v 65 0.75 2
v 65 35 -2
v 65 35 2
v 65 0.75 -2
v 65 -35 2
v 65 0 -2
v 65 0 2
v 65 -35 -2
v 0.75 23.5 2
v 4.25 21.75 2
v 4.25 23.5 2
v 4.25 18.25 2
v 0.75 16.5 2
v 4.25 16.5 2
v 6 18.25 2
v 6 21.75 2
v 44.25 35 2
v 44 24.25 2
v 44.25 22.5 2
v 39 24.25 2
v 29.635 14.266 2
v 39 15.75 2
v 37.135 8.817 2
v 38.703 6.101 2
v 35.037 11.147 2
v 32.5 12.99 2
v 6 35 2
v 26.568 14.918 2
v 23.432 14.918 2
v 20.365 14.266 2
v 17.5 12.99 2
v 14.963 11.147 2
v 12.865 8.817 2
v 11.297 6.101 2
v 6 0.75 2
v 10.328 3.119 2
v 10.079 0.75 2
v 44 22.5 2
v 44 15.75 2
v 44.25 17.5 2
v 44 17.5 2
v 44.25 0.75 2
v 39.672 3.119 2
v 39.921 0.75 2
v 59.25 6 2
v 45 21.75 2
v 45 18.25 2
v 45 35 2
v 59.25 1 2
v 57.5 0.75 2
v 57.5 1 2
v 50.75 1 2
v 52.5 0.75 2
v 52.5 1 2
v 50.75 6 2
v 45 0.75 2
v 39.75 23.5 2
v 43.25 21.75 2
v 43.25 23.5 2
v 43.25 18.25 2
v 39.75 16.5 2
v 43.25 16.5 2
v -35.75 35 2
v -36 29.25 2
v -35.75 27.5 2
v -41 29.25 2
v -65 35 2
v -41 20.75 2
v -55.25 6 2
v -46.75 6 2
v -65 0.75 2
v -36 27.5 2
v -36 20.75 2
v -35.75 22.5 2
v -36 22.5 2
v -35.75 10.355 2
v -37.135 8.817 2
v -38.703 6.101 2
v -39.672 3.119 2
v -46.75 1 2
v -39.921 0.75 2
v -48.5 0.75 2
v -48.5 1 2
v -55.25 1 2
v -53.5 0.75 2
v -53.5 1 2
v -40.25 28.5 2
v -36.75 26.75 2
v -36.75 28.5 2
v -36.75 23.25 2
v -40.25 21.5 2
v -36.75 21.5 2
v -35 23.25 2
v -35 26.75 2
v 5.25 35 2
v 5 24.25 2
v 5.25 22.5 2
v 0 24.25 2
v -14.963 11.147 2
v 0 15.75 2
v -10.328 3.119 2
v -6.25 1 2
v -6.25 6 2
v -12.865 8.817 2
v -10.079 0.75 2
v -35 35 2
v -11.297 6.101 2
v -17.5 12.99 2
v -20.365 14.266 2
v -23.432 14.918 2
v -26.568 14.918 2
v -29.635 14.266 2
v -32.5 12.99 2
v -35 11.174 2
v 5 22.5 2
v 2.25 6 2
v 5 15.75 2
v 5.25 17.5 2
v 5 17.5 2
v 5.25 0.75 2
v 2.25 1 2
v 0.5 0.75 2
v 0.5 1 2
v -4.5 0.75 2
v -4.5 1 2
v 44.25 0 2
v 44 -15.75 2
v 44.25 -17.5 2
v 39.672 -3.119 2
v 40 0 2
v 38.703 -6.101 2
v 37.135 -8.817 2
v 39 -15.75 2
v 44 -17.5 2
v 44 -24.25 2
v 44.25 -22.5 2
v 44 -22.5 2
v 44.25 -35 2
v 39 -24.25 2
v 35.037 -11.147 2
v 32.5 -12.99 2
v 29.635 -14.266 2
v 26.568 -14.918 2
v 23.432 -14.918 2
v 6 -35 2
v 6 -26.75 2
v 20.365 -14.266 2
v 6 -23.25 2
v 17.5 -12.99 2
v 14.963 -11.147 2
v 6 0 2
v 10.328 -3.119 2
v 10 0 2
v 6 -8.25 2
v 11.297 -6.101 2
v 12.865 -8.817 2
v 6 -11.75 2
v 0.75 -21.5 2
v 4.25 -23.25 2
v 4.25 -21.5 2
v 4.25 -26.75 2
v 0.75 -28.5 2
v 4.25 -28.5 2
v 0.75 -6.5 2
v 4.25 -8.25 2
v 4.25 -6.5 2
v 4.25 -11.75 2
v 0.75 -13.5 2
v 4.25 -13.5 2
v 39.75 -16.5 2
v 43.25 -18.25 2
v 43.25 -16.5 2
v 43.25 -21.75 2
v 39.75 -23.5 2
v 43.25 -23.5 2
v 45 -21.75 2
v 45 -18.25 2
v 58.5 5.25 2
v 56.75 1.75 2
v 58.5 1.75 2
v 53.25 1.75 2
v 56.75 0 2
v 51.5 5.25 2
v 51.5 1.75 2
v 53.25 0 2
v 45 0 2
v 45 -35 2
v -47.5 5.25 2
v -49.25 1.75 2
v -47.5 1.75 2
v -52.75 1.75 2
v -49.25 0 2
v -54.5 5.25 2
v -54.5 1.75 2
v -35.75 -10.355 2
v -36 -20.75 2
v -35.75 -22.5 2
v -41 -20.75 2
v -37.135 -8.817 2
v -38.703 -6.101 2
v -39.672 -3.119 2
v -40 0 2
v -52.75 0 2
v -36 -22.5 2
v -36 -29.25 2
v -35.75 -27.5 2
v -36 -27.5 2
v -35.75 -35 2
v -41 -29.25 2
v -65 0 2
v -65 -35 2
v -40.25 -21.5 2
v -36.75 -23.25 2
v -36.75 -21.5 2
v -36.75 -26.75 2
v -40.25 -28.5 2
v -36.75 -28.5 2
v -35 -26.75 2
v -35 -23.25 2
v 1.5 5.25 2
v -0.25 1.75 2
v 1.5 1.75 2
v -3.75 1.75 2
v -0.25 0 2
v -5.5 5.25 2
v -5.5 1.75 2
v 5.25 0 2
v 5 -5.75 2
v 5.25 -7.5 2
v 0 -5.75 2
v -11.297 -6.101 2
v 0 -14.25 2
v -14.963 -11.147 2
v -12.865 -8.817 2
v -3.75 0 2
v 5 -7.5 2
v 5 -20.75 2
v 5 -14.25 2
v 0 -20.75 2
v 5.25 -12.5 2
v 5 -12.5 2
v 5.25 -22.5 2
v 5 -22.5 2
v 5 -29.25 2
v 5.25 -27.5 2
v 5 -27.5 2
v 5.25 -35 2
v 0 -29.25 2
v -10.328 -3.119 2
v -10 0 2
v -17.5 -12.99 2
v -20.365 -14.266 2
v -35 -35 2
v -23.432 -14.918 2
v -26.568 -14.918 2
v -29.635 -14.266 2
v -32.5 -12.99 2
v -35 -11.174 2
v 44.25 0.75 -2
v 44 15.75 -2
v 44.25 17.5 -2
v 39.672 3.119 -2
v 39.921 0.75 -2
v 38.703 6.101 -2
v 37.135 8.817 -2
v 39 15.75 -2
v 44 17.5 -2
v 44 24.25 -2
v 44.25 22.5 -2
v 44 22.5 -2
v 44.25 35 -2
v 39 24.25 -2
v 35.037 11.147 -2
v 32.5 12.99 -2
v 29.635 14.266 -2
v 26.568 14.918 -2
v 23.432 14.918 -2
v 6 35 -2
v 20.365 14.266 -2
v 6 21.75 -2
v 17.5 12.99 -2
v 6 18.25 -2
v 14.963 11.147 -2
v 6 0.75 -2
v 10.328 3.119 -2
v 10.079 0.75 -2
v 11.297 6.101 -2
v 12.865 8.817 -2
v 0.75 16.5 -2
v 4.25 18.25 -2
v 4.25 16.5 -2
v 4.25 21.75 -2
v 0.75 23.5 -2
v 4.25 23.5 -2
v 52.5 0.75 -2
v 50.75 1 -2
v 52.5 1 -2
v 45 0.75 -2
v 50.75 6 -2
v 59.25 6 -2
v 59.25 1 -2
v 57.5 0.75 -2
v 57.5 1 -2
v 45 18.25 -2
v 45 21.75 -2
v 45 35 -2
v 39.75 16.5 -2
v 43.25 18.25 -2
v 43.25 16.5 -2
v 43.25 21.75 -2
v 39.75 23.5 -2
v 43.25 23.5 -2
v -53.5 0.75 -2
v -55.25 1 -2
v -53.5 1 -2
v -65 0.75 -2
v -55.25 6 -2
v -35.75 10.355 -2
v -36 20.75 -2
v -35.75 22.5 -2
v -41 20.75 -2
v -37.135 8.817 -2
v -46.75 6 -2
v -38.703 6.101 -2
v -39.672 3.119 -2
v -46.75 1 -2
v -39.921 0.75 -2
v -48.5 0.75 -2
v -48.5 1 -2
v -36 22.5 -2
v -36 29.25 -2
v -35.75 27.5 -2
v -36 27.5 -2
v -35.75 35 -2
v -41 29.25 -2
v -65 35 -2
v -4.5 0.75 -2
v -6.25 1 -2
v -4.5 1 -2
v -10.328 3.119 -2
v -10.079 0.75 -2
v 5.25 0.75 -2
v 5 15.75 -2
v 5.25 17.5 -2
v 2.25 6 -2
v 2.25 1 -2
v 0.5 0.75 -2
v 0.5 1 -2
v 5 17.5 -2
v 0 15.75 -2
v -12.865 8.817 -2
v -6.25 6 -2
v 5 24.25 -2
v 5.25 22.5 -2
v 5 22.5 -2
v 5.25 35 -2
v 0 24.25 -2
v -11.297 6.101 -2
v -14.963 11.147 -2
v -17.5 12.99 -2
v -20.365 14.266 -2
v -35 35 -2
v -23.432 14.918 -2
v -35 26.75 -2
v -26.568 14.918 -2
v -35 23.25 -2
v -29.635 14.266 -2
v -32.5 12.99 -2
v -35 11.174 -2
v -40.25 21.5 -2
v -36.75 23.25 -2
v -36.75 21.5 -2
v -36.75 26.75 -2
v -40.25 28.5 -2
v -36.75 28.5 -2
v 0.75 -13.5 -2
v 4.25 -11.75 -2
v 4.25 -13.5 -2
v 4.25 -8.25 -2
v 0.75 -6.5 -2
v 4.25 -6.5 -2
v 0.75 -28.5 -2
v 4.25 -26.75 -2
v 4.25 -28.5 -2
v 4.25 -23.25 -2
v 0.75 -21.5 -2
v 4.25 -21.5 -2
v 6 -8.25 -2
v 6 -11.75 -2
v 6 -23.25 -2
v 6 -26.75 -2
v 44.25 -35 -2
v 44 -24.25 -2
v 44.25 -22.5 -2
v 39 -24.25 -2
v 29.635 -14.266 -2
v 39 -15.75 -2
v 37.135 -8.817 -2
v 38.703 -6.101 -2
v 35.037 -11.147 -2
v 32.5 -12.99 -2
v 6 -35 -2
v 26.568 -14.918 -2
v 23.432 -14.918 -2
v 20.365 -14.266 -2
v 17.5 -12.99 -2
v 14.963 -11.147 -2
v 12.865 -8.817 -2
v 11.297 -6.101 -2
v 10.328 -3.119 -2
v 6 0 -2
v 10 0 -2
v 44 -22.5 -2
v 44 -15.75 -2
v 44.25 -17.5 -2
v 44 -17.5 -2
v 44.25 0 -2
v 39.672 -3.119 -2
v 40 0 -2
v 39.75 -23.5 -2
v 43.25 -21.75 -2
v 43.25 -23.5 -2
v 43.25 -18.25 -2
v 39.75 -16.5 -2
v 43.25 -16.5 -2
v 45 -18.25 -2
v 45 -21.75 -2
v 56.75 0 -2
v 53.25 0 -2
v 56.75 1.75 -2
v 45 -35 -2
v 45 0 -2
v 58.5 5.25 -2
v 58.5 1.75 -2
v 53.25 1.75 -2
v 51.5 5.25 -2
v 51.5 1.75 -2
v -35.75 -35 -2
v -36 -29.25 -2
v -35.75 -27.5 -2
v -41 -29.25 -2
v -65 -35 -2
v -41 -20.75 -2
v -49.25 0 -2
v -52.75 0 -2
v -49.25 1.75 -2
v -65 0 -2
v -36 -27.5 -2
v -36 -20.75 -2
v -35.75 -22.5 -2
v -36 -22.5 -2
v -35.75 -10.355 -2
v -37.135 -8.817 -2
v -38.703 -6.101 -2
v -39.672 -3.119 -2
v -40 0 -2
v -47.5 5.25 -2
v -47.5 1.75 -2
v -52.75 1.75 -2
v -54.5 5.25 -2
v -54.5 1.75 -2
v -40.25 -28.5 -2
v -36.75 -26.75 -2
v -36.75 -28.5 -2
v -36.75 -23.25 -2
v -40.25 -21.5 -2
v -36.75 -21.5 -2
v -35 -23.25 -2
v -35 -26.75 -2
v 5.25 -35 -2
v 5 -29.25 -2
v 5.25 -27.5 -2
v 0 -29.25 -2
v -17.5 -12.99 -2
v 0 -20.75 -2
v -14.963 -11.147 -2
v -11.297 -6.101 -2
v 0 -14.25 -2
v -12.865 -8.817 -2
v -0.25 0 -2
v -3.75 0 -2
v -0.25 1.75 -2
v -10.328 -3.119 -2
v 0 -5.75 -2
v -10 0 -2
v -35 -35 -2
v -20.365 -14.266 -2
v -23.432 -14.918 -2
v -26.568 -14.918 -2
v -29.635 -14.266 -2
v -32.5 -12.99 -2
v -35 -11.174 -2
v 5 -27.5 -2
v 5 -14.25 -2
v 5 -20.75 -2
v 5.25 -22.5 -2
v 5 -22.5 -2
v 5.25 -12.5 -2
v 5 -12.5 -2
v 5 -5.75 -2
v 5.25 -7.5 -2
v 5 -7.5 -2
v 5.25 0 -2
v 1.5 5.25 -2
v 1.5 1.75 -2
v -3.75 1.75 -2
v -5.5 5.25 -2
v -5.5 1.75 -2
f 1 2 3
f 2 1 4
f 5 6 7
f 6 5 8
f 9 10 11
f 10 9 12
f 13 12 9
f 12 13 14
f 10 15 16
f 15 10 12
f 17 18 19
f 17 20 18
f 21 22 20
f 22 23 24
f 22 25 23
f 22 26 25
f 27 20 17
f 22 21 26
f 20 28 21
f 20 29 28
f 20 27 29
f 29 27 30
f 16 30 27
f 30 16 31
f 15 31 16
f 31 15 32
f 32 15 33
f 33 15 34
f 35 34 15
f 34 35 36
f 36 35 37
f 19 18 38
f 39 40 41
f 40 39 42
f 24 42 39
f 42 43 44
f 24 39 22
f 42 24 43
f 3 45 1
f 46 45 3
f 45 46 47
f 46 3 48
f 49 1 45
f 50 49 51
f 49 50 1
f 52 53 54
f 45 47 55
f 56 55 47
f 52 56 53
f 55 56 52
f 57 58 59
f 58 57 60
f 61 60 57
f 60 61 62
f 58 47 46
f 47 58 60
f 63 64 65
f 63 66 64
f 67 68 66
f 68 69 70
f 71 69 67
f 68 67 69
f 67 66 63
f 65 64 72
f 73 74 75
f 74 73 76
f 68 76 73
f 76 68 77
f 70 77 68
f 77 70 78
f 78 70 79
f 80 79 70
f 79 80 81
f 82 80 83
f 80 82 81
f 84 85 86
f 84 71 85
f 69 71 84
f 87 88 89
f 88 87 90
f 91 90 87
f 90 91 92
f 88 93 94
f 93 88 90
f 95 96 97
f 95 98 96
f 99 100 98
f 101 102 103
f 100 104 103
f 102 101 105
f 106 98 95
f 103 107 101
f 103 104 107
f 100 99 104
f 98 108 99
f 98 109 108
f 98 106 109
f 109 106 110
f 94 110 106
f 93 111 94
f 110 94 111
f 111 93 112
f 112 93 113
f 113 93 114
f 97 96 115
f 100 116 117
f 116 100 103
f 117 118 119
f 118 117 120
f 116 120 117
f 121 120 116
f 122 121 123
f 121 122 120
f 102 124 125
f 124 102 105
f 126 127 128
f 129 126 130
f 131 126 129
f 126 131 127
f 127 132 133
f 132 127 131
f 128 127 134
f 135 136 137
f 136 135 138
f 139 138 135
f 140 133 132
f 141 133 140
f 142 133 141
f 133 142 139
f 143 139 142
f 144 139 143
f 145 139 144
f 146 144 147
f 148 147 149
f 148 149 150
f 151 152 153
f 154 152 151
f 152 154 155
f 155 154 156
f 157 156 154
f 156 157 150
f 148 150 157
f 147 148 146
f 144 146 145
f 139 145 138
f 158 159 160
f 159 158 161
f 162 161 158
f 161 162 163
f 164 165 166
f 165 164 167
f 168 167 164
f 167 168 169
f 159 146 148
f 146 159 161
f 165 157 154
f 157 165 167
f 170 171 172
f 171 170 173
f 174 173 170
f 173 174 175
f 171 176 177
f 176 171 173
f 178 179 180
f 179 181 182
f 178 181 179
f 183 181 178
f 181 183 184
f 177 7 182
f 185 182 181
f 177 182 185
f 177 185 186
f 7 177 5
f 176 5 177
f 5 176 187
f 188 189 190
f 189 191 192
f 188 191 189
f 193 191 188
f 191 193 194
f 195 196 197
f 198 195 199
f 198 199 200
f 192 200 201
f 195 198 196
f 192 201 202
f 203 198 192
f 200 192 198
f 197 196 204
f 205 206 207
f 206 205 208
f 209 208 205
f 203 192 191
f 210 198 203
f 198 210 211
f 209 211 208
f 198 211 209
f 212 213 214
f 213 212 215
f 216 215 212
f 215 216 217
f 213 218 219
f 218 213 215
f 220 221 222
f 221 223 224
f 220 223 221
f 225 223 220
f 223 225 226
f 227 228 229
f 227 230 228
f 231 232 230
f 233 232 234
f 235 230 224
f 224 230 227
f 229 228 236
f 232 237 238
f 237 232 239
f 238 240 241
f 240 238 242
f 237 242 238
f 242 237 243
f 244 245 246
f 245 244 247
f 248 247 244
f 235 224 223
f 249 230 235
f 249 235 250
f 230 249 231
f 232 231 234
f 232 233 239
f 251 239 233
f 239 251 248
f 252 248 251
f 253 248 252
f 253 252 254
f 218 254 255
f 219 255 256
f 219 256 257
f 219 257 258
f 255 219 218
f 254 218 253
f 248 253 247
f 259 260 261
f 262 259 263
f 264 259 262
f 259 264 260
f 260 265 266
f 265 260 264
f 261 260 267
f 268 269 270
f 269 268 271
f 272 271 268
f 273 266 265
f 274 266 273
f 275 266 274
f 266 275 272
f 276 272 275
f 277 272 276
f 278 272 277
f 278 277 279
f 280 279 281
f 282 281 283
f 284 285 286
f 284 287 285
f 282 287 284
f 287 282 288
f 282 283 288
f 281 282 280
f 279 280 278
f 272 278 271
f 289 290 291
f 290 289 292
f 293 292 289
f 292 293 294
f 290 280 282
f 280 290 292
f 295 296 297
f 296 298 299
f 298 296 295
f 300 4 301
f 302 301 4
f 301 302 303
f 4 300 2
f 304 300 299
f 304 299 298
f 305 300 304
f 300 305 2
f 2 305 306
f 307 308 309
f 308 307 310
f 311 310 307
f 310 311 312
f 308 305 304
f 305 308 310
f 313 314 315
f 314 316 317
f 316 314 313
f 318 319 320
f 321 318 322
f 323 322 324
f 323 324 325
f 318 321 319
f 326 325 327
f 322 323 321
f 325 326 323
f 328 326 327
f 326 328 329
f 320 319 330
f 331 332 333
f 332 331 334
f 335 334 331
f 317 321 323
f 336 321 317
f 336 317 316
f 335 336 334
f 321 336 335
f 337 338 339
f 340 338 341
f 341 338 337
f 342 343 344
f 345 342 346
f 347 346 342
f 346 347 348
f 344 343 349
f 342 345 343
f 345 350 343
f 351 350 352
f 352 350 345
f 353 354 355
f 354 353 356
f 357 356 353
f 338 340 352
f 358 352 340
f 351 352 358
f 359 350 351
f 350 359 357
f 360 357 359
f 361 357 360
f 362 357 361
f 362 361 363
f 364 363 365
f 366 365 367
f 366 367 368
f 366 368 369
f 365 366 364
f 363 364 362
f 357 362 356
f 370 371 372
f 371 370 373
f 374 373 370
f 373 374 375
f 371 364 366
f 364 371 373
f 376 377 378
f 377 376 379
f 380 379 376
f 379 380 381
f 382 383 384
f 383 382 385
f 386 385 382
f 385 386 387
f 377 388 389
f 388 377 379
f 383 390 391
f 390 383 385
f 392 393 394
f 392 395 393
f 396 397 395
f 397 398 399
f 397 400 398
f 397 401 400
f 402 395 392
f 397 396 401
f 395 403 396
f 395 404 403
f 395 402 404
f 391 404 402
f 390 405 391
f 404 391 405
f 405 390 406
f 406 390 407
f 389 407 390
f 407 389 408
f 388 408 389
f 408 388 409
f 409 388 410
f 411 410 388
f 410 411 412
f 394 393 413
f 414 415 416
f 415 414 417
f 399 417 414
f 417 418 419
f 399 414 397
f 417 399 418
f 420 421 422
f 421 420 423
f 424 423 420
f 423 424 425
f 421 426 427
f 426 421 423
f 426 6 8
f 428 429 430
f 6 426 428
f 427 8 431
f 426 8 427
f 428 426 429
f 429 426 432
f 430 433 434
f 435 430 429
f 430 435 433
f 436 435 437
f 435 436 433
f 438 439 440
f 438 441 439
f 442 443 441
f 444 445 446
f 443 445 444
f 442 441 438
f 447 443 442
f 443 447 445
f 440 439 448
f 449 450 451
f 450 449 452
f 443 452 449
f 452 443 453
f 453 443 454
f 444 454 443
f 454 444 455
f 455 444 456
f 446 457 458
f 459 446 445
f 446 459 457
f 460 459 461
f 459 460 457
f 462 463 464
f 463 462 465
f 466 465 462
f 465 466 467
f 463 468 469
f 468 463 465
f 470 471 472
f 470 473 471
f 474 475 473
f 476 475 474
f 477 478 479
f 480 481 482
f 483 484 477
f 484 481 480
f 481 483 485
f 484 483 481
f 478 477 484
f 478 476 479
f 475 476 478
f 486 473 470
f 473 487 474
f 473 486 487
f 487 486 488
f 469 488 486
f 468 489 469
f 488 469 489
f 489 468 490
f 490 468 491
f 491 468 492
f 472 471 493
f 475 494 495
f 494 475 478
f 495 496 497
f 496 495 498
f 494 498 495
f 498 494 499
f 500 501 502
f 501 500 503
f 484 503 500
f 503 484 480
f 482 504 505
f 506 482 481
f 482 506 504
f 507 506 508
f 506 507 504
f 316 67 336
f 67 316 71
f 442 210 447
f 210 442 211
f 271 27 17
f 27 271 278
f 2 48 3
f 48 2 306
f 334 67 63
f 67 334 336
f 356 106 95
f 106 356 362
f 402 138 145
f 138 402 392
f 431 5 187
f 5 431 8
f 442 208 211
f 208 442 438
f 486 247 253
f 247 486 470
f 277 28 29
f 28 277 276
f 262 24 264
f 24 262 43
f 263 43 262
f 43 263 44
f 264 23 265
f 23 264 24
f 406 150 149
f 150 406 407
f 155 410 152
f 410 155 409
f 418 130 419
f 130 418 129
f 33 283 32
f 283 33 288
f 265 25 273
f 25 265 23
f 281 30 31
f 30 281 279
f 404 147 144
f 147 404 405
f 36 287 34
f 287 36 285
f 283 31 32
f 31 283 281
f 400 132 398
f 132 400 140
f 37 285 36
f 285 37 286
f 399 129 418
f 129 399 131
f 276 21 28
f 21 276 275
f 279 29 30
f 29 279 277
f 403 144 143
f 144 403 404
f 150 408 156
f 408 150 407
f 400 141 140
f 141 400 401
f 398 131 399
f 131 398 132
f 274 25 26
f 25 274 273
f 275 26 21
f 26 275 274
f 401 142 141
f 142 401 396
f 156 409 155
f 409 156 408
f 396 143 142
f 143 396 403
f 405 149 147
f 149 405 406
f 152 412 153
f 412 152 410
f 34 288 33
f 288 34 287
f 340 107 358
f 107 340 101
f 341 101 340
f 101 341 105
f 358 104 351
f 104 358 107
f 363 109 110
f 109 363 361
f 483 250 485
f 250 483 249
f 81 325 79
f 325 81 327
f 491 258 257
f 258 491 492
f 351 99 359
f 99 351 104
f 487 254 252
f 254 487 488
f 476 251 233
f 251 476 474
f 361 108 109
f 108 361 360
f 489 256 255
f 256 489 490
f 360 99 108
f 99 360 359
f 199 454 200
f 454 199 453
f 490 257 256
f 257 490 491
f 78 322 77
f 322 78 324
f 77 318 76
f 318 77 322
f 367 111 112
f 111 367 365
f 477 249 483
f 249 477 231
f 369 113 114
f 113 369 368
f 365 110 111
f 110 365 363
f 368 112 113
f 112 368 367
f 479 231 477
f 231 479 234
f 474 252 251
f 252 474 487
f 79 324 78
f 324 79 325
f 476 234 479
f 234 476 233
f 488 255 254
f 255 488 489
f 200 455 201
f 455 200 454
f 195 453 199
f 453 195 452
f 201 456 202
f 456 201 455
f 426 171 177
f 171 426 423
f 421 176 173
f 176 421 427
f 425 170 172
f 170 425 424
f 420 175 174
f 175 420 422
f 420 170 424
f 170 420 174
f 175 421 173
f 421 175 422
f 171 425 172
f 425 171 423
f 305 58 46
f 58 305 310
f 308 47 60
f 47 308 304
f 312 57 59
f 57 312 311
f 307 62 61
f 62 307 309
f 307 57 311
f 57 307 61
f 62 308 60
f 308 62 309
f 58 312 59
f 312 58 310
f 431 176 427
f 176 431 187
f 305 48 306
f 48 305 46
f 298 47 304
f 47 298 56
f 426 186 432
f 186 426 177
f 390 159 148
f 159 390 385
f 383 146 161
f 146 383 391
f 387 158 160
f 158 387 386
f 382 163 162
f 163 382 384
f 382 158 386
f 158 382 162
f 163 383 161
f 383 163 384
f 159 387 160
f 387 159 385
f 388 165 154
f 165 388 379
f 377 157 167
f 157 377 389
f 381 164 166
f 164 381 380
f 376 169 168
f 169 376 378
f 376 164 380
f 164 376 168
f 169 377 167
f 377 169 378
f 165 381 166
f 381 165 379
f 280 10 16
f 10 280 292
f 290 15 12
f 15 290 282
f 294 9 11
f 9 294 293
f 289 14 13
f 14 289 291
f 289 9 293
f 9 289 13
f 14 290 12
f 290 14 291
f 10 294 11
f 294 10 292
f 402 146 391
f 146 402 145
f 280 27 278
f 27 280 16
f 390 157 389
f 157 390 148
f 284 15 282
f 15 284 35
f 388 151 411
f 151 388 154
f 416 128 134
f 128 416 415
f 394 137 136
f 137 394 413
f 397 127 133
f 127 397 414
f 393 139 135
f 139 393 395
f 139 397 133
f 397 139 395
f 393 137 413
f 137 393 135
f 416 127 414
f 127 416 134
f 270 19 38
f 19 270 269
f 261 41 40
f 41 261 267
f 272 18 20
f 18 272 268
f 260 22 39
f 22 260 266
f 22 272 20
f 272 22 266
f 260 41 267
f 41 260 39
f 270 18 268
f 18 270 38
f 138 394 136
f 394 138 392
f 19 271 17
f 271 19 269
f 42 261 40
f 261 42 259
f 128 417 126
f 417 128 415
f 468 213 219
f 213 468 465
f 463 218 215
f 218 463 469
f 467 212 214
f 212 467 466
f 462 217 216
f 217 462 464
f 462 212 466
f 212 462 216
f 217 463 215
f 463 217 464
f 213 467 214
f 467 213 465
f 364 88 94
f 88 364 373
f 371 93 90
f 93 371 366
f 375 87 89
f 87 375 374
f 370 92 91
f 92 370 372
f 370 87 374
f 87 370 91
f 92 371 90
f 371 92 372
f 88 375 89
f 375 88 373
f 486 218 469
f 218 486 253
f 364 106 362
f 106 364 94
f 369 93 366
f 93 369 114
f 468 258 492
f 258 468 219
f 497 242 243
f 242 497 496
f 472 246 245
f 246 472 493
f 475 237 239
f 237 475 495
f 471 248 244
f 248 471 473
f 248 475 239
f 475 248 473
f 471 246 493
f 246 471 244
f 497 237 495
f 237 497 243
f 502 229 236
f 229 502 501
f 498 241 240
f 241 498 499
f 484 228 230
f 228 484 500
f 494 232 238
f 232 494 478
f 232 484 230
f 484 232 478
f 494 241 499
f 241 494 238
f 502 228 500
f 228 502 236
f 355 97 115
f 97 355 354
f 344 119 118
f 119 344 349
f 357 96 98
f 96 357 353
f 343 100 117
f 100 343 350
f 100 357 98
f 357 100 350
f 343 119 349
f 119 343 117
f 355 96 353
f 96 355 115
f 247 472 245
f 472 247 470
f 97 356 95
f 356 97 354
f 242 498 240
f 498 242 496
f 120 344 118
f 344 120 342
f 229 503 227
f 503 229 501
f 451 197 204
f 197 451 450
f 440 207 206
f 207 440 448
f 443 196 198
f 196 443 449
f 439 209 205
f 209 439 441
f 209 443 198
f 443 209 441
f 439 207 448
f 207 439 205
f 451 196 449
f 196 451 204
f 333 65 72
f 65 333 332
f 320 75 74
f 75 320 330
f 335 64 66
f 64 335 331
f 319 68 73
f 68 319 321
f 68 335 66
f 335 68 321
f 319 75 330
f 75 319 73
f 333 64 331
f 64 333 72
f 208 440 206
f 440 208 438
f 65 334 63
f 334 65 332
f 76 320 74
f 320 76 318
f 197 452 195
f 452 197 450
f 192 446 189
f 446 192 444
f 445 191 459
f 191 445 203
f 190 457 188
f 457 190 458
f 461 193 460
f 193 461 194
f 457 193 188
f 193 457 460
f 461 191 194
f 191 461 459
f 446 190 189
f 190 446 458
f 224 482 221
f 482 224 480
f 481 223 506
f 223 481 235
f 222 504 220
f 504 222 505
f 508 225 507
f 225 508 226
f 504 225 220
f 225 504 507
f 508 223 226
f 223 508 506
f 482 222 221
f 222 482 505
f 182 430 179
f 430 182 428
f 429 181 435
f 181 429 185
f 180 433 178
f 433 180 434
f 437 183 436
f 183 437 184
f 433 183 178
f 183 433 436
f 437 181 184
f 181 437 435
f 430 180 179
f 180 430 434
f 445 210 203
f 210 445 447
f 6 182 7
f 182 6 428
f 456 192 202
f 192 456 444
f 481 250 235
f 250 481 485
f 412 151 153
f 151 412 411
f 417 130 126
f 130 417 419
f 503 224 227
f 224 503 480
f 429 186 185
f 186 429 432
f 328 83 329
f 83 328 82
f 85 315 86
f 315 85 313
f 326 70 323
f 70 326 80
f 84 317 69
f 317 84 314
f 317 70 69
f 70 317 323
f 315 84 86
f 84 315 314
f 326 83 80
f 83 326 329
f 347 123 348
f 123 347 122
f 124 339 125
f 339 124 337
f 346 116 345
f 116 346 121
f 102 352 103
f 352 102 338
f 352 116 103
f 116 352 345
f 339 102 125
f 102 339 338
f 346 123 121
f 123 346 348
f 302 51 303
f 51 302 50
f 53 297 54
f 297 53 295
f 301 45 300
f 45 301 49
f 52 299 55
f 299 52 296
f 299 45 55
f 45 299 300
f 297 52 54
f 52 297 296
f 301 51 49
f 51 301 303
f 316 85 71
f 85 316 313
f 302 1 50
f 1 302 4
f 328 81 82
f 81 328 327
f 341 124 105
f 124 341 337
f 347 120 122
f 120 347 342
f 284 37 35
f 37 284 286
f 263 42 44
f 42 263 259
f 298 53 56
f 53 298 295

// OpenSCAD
// file: demoobject2.scad
module drawDemoObject()
{
	difference()
	{
		cube([130,70,4], center=true);
		translate ([25,0,0]) cylinder(h=5, r=15, center=true);
		translate ([-25,0,0]) cylinder(h=5, r=15, center=true);
	}
}
// file: puzzlecutlib.scad
//OpenSCAD PuzzleCut Library Demo - by Rich Olson
//http://www.nothinglabs.com
//Tested on build 2012.08.22
//License: http://creativecommons.org/licenses/by/3.0/


module xMaleCut(offset = 0, cut = xCut1)
{
	difference()
	{
		child(0);	
		translate([0,offset,0]) makePuzzleStamp(cutLocations = cut);
	}
}


module xFemaleCut(offset = 0, cut = xCut1)
{
	intersection()
	{
		child(0);
		translate([0,offset,0]) makePuzzleStamp(cutLocations = cut,
			 kerf = kerf);	//only set kerf on female side
	}
}


module yMaleCut(offset = 0, cut = yCut1)
{
	difference()
	{
		child(0);	
		rotate ([0,0,90]) translate([0,offset,0]) makePuzzleStamp(cutLocations = cut);
	}
}


module yFemaleCut(offset = 0, cut = yCut1)
{
	intersection()
	{
		child(0);
		rotate ([0,0,90]) translate([0,offset,0]) makePuzzleStamp(cutLocations = cut,
			 kerf = kerf);	//only set kerf on female side
	}
}



module makePuzzleStamp(kerf = 0)
{
	difference()
	{
		//make the cube
		translate ([0,stampSize[0] / 2 - kerf,0])
			cube (stampSize, center = true);
		
		//make the cuts
		for ( i = cutLocations )
		{
			translate([i,0,0])
				cube ([(cutSize / 2) - kerf * 2, cutSize - kerf * 2,stampSize[2]], center = true);
			translate([i,cutSize / 2,0])
				cube ([cutSize - kerf *  2,(cutSize / 2) - kerf * 2, stampSize[2]], center = true);
		}		
	}
}
// main file
//OpenSCAD PuzzleCut Library Demo - by Rich Olson
//http://www.nothinglabs.com
//Tested on build 2012.08.22
//License: http://creativecommons.org/licenses/by/3.0/

//NOTE: Complex objects may result in "normalized tree" errors / rendering problems
//These can be worked around by doing a full render (just hit F6)

include <puzzlecutlib.scad>
include <demoobject2.scad>

stampSize = [500,500,100];		//size of cutting stamp (should cover 1/2 of object)

cutSize = 7;	//size of the puzzle cuts

xCut1 = [-51, -2, 55];			//locations of puzzle cuts relative to Y axis center
yCut1 = [-20, 20];				//locations of puzzle cuts relative to Y axis center
yCut2 = [-25, -10, 20];			//additional Y cut
yCut3 = [-25, 25];				//additional Y cut

kerf = -0.75;	//supports +/- numbers (greater value = tighter fit)
					//using a small negative number may be useful to assure easy fit for 3d printing
					//using positive values useful for lasercutting
					//negative values can also help visualize cuts without seperating pieces

xMaleCut(offset = 0, cut = xCut1) 
	yCuts();

xFemaleCut(offset = 0, cut = xCut1) 
	yCuts();

module yCuts()
{
		yMaleCut(offset = -45, cut = yCut1)
			drawDemoObject();

		yFemaleCut(offset = -45, cut = yCut1)
			yMaleCut(offset = -6, cut = yCut2)
				drawDemoObject();

		yFemaleCut(offset = -6, cut = yCut2)
			yMaleCut(offset = 35, cut = yCut3)
				drawDemoObject();

		yFemaleCut(offset = 35, cut = yCut3)
				drawDemoObject();

}
